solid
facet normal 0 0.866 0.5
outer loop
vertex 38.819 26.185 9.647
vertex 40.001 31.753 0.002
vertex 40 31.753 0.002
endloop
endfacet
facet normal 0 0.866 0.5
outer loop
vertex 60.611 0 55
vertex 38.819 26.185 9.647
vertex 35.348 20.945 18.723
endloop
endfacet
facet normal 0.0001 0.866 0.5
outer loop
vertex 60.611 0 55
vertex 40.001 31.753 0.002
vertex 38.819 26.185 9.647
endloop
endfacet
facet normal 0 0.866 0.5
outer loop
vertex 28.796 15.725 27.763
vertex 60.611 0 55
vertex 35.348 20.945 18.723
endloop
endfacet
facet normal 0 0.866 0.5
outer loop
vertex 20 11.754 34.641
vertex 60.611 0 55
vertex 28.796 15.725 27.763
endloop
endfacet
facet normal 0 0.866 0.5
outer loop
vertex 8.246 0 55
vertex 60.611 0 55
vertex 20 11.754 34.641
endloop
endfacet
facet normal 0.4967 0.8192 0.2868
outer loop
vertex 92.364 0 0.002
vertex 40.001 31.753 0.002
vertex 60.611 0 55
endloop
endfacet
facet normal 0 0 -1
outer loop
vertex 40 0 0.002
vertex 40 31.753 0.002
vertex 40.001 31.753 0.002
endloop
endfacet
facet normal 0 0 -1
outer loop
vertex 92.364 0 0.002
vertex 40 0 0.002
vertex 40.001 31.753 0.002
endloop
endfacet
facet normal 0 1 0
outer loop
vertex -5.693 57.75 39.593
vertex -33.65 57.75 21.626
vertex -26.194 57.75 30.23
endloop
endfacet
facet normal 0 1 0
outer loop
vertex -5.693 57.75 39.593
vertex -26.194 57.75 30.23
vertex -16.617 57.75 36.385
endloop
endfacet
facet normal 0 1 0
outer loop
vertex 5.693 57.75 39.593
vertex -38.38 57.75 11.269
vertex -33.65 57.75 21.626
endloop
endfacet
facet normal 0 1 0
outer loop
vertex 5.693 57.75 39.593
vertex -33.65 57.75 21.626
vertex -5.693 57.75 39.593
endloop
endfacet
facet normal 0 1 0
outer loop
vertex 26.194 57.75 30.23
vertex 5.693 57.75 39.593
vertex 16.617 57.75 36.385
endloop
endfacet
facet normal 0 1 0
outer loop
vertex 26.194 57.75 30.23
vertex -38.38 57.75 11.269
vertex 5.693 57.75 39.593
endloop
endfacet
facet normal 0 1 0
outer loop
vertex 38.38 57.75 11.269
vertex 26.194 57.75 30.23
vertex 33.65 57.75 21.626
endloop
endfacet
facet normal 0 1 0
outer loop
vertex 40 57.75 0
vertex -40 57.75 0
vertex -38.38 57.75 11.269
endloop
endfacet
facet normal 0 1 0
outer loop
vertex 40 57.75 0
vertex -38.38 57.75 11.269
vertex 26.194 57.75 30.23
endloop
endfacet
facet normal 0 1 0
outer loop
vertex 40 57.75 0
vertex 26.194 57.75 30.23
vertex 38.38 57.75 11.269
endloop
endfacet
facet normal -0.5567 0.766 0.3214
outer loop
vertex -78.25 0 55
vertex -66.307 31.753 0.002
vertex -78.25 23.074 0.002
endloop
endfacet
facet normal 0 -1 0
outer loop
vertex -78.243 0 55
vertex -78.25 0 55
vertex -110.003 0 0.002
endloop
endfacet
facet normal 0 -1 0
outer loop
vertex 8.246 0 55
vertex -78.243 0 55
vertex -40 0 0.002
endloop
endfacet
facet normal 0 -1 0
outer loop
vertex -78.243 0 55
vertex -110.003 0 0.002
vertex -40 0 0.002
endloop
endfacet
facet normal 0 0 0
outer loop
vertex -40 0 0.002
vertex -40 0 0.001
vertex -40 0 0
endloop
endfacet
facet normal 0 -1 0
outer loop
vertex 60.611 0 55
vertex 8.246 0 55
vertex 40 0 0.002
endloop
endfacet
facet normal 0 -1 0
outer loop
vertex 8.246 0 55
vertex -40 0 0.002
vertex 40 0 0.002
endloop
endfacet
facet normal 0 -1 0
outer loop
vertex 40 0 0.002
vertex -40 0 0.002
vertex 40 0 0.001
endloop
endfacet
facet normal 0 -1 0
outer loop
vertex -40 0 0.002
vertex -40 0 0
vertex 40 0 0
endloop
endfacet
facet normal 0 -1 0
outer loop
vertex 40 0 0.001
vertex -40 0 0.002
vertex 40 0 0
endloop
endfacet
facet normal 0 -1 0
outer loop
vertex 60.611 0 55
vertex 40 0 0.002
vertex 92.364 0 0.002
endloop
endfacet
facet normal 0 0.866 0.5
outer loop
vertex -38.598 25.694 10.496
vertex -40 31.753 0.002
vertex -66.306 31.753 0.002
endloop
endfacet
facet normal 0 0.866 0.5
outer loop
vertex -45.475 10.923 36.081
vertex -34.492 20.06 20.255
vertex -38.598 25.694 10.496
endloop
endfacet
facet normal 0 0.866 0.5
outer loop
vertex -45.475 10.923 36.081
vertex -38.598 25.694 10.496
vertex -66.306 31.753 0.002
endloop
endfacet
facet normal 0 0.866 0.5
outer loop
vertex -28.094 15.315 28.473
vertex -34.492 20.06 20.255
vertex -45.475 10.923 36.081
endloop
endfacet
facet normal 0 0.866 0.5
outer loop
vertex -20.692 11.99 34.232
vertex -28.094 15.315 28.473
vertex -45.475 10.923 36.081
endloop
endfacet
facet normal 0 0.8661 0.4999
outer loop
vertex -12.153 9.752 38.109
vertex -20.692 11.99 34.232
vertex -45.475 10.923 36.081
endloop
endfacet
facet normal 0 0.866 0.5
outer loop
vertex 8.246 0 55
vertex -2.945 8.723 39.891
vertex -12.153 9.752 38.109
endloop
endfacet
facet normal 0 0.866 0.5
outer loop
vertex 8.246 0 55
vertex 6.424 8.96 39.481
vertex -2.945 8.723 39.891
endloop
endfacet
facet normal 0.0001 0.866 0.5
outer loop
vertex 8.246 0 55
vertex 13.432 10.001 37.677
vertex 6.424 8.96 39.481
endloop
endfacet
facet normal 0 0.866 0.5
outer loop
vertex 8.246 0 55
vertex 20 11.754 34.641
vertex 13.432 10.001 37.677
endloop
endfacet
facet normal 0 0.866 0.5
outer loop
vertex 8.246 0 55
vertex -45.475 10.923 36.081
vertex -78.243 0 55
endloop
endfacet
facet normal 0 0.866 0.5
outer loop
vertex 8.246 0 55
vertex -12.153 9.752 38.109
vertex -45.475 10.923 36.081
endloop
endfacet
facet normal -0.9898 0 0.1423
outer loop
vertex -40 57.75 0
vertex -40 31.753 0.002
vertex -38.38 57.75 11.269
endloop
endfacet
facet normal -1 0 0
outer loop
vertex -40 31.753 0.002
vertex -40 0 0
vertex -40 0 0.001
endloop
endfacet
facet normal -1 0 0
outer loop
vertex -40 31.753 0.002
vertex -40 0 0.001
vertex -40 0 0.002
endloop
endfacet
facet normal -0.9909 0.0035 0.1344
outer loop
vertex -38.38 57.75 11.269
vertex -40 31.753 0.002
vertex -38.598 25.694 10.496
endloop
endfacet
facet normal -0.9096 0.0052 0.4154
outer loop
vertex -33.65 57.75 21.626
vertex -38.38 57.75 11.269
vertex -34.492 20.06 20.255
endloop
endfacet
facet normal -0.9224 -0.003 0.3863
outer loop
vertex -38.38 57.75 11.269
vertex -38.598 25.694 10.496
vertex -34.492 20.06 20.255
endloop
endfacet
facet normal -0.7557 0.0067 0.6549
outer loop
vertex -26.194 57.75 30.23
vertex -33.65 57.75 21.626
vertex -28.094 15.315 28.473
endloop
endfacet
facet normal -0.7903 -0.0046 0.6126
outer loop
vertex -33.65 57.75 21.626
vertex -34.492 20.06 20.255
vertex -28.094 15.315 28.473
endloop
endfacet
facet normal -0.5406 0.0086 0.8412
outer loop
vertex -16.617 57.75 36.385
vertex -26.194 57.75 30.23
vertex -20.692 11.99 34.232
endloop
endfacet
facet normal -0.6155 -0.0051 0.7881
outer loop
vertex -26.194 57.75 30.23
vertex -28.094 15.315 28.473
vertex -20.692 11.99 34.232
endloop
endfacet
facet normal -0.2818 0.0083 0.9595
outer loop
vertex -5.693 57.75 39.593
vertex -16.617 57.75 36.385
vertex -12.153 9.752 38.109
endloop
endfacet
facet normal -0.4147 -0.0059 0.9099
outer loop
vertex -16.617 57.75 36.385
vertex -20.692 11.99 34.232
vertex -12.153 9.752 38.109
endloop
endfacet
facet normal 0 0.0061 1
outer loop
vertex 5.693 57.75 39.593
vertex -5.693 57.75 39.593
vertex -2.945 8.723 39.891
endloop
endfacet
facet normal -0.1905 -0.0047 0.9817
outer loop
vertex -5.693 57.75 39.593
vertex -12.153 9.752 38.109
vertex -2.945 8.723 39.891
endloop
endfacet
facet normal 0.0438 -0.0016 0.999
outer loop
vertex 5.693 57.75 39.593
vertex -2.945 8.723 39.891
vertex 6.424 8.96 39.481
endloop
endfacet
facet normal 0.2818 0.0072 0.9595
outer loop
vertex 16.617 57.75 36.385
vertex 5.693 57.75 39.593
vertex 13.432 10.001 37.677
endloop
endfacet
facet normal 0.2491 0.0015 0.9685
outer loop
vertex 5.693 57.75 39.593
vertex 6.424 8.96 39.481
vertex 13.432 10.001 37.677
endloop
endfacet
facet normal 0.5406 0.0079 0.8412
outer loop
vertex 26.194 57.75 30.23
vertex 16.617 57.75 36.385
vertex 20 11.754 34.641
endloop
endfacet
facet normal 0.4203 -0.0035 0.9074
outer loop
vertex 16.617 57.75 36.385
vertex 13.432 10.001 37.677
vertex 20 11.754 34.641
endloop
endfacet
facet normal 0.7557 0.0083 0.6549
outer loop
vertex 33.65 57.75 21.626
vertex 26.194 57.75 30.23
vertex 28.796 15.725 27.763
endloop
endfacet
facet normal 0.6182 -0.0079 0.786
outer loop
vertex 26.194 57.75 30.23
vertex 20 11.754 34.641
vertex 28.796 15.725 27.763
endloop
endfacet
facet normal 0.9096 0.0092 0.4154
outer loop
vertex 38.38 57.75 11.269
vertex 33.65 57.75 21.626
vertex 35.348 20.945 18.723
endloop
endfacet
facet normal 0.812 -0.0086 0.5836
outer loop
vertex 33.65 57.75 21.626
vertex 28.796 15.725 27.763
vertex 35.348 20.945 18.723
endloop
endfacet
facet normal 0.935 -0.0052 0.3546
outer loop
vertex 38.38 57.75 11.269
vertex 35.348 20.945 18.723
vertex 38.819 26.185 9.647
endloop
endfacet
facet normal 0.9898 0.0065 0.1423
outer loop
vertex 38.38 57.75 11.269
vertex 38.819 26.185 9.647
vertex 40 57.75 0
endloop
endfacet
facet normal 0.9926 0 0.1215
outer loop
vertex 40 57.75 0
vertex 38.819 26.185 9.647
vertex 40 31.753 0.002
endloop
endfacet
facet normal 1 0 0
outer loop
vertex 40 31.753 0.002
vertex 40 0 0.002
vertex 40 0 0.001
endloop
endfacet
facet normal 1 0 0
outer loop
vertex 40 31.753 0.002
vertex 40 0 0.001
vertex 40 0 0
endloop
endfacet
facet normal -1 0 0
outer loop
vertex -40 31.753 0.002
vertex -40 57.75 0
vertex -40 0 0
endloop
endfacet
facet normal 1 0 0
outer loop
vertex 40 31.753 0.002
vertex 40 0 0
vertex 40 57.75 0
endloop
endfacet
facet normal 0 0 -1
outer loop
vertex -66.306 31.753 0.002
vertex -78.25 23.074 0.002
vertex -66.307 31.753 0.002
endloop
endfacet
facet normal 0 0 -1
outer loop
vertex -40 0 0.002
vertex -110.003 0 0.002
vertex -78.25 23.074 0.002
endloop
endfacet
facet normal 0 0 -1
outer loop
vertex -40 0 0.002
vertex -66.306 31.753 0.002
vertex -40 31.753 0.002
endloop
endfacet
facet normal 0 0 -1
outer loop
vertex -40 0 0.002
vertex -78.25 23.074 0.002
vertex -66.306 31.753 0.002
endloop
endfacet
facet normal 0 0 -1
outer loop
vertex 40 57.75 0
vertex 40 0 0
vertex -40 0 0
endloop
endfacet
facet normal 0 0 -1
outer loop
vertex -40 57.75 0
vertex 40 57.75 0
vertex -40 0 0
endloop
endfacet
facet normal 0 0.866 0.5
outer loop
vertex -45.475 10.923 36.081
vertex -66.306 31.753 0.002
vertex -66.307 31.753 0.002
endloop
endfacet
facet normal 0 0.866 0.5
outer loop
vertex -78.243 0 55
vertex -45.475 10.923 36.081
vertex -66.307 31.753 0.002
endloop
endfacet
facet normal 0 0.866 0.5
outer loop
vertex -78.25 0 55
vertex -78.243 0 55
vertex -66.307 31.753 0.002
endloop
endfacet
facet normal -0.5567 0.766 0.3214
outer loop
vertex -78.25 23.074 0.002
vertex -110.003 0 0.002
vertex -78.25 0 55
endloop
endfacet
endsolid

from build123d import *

# Parameters (mm, degrees)
EXTRUDE1_DEPTH      = 40
EXTRUDE1_DEPTH_BACK = 78.25
EXTRUDE2_DEPTH      = 31.755
EXTRUDE4_DEPTH      = 51.755
SKETCH7_W           = 50.762718211
SKETCH7_H           = 77.693391575
CUT_EXTRUDE1_DEPTH  = 10
SKETCH8_W           = 180.54307219
SKETCH8_H           = 130.318791492
CUT_EXTRUDE2_DEPTH  = 40
SKETCH9_W           = 213.468812953
SKETCH9_H           = 29.374372581
CUT_EXTRUDE3_DEPTH  = 32.754264805
EXTRUDE5_DEPTH      = 57.75


with BuildPart() as part:
    # Sketch2 → Extrude1 (new body, two sides)
    with BuildSketch(Plane(origin=(0, 0, 0), x_dir=(0, 0, -1), z_dir=(1, 0, 0))) as extrude1_sk:
        Polygon((0, 0), (0, 31.754264805), (-55, 0), align=None)
    extrude(amount=EXTRUDE1_DEPTH)
    extrude(extrude1_sk.sketch, amount=-EXTRUDE1_DEPTH_BACK)

    # Sketch4 → Extrude2 (add, symmetric)
    with BuildSketch(Plane(origin=(-11.6225, 0, -20.130760511), x_dir=(0.866025404, 0, -0.5), z_dir=(0.5, 0, 0.866025404))):
        Polygon((-95.266487846, 0), (-57.423228684, 31.754264805), (-57.423228684, 0), align=None)
    extrude(amount=EXTRUDE2_DEPTH, both=True)

    # Sketch6 → Extrude4 (add, symmetric)
    with BuildSketch(Plane(origin=(-1.270622992, 0, 2.200783579), x_dir=(0.866025404, 0, 0.5), z_dir=(-0.5, 0, 0.866025404))):
        Polygon((34.641016151, 31.754264805), (79.990806139, 0), (34.641016151, 0), align=None)
    extrude(amount=EXTRUDE4_DEPTH, both=True)

    # Sketch7 → Cut-Extrude1 (cut)
    with BuildSketch(Plane(origin=(-34.088334257, 46.909587917, 19.68090896), x_dir=(-0.830733451, -0.513322613, -0.215364408), z_dir=(-0.556670399, 0.766044443, 0.321393805))):
        with Locations((42.354713251, 21.026293217)):
            Rectangle(SKETCH7_W, SKETCH7_H)
    extrude(amount=CUT_EXTRUDE1_DEPTH, mode=Mode.SUBTRACT)

    # Sketch8 → Cut-Extrude2 (cut)
    with BuildSketch(Plane(origin=(0, 23.815698604, 13.75), x_dir=(-1, 0, 0), z_dir=(0, 0.866025404, 0.5))):
        with Locations((7.268110747, 13.895626923)):
            Rectangle(SKETCH8_W, SKETCH8_H)
    extrude(amount=CUT_EXTRUDE2_DEPTH, mode=Mode.SUBTRACT)

    # Sketch9 → Cut-Extrude3 (cut, through all)
    with BuildSketch(Plane(origin=(0, 0, 0), x_dir=(1, 0, 0), z_dir=(0, 1, 0))):
        with Locations((-3.268792127, 14.685339576)):
            Rectangle(SKETCH9_W, SKETCH9_H)
    extrude(amount=CUT_EXTRUDE3_DEPTH, mode=Mode.SUBTRACT)

    # Sketch1 → Extrude5 (add)
    with BuildSketch(Plane(origin=(0, 0, 0), x_dir=(1, 0, 0), z_dir=(0, 1, 0))):
        with BuildLine():
            Line((40, 0), (-40, 0))
            ThreePointArc((-40, 0), (0, -40), (40, 0))
        make_face()
    extrude(amount=EXTRUDE5_DEPTH)


solid = part.part
